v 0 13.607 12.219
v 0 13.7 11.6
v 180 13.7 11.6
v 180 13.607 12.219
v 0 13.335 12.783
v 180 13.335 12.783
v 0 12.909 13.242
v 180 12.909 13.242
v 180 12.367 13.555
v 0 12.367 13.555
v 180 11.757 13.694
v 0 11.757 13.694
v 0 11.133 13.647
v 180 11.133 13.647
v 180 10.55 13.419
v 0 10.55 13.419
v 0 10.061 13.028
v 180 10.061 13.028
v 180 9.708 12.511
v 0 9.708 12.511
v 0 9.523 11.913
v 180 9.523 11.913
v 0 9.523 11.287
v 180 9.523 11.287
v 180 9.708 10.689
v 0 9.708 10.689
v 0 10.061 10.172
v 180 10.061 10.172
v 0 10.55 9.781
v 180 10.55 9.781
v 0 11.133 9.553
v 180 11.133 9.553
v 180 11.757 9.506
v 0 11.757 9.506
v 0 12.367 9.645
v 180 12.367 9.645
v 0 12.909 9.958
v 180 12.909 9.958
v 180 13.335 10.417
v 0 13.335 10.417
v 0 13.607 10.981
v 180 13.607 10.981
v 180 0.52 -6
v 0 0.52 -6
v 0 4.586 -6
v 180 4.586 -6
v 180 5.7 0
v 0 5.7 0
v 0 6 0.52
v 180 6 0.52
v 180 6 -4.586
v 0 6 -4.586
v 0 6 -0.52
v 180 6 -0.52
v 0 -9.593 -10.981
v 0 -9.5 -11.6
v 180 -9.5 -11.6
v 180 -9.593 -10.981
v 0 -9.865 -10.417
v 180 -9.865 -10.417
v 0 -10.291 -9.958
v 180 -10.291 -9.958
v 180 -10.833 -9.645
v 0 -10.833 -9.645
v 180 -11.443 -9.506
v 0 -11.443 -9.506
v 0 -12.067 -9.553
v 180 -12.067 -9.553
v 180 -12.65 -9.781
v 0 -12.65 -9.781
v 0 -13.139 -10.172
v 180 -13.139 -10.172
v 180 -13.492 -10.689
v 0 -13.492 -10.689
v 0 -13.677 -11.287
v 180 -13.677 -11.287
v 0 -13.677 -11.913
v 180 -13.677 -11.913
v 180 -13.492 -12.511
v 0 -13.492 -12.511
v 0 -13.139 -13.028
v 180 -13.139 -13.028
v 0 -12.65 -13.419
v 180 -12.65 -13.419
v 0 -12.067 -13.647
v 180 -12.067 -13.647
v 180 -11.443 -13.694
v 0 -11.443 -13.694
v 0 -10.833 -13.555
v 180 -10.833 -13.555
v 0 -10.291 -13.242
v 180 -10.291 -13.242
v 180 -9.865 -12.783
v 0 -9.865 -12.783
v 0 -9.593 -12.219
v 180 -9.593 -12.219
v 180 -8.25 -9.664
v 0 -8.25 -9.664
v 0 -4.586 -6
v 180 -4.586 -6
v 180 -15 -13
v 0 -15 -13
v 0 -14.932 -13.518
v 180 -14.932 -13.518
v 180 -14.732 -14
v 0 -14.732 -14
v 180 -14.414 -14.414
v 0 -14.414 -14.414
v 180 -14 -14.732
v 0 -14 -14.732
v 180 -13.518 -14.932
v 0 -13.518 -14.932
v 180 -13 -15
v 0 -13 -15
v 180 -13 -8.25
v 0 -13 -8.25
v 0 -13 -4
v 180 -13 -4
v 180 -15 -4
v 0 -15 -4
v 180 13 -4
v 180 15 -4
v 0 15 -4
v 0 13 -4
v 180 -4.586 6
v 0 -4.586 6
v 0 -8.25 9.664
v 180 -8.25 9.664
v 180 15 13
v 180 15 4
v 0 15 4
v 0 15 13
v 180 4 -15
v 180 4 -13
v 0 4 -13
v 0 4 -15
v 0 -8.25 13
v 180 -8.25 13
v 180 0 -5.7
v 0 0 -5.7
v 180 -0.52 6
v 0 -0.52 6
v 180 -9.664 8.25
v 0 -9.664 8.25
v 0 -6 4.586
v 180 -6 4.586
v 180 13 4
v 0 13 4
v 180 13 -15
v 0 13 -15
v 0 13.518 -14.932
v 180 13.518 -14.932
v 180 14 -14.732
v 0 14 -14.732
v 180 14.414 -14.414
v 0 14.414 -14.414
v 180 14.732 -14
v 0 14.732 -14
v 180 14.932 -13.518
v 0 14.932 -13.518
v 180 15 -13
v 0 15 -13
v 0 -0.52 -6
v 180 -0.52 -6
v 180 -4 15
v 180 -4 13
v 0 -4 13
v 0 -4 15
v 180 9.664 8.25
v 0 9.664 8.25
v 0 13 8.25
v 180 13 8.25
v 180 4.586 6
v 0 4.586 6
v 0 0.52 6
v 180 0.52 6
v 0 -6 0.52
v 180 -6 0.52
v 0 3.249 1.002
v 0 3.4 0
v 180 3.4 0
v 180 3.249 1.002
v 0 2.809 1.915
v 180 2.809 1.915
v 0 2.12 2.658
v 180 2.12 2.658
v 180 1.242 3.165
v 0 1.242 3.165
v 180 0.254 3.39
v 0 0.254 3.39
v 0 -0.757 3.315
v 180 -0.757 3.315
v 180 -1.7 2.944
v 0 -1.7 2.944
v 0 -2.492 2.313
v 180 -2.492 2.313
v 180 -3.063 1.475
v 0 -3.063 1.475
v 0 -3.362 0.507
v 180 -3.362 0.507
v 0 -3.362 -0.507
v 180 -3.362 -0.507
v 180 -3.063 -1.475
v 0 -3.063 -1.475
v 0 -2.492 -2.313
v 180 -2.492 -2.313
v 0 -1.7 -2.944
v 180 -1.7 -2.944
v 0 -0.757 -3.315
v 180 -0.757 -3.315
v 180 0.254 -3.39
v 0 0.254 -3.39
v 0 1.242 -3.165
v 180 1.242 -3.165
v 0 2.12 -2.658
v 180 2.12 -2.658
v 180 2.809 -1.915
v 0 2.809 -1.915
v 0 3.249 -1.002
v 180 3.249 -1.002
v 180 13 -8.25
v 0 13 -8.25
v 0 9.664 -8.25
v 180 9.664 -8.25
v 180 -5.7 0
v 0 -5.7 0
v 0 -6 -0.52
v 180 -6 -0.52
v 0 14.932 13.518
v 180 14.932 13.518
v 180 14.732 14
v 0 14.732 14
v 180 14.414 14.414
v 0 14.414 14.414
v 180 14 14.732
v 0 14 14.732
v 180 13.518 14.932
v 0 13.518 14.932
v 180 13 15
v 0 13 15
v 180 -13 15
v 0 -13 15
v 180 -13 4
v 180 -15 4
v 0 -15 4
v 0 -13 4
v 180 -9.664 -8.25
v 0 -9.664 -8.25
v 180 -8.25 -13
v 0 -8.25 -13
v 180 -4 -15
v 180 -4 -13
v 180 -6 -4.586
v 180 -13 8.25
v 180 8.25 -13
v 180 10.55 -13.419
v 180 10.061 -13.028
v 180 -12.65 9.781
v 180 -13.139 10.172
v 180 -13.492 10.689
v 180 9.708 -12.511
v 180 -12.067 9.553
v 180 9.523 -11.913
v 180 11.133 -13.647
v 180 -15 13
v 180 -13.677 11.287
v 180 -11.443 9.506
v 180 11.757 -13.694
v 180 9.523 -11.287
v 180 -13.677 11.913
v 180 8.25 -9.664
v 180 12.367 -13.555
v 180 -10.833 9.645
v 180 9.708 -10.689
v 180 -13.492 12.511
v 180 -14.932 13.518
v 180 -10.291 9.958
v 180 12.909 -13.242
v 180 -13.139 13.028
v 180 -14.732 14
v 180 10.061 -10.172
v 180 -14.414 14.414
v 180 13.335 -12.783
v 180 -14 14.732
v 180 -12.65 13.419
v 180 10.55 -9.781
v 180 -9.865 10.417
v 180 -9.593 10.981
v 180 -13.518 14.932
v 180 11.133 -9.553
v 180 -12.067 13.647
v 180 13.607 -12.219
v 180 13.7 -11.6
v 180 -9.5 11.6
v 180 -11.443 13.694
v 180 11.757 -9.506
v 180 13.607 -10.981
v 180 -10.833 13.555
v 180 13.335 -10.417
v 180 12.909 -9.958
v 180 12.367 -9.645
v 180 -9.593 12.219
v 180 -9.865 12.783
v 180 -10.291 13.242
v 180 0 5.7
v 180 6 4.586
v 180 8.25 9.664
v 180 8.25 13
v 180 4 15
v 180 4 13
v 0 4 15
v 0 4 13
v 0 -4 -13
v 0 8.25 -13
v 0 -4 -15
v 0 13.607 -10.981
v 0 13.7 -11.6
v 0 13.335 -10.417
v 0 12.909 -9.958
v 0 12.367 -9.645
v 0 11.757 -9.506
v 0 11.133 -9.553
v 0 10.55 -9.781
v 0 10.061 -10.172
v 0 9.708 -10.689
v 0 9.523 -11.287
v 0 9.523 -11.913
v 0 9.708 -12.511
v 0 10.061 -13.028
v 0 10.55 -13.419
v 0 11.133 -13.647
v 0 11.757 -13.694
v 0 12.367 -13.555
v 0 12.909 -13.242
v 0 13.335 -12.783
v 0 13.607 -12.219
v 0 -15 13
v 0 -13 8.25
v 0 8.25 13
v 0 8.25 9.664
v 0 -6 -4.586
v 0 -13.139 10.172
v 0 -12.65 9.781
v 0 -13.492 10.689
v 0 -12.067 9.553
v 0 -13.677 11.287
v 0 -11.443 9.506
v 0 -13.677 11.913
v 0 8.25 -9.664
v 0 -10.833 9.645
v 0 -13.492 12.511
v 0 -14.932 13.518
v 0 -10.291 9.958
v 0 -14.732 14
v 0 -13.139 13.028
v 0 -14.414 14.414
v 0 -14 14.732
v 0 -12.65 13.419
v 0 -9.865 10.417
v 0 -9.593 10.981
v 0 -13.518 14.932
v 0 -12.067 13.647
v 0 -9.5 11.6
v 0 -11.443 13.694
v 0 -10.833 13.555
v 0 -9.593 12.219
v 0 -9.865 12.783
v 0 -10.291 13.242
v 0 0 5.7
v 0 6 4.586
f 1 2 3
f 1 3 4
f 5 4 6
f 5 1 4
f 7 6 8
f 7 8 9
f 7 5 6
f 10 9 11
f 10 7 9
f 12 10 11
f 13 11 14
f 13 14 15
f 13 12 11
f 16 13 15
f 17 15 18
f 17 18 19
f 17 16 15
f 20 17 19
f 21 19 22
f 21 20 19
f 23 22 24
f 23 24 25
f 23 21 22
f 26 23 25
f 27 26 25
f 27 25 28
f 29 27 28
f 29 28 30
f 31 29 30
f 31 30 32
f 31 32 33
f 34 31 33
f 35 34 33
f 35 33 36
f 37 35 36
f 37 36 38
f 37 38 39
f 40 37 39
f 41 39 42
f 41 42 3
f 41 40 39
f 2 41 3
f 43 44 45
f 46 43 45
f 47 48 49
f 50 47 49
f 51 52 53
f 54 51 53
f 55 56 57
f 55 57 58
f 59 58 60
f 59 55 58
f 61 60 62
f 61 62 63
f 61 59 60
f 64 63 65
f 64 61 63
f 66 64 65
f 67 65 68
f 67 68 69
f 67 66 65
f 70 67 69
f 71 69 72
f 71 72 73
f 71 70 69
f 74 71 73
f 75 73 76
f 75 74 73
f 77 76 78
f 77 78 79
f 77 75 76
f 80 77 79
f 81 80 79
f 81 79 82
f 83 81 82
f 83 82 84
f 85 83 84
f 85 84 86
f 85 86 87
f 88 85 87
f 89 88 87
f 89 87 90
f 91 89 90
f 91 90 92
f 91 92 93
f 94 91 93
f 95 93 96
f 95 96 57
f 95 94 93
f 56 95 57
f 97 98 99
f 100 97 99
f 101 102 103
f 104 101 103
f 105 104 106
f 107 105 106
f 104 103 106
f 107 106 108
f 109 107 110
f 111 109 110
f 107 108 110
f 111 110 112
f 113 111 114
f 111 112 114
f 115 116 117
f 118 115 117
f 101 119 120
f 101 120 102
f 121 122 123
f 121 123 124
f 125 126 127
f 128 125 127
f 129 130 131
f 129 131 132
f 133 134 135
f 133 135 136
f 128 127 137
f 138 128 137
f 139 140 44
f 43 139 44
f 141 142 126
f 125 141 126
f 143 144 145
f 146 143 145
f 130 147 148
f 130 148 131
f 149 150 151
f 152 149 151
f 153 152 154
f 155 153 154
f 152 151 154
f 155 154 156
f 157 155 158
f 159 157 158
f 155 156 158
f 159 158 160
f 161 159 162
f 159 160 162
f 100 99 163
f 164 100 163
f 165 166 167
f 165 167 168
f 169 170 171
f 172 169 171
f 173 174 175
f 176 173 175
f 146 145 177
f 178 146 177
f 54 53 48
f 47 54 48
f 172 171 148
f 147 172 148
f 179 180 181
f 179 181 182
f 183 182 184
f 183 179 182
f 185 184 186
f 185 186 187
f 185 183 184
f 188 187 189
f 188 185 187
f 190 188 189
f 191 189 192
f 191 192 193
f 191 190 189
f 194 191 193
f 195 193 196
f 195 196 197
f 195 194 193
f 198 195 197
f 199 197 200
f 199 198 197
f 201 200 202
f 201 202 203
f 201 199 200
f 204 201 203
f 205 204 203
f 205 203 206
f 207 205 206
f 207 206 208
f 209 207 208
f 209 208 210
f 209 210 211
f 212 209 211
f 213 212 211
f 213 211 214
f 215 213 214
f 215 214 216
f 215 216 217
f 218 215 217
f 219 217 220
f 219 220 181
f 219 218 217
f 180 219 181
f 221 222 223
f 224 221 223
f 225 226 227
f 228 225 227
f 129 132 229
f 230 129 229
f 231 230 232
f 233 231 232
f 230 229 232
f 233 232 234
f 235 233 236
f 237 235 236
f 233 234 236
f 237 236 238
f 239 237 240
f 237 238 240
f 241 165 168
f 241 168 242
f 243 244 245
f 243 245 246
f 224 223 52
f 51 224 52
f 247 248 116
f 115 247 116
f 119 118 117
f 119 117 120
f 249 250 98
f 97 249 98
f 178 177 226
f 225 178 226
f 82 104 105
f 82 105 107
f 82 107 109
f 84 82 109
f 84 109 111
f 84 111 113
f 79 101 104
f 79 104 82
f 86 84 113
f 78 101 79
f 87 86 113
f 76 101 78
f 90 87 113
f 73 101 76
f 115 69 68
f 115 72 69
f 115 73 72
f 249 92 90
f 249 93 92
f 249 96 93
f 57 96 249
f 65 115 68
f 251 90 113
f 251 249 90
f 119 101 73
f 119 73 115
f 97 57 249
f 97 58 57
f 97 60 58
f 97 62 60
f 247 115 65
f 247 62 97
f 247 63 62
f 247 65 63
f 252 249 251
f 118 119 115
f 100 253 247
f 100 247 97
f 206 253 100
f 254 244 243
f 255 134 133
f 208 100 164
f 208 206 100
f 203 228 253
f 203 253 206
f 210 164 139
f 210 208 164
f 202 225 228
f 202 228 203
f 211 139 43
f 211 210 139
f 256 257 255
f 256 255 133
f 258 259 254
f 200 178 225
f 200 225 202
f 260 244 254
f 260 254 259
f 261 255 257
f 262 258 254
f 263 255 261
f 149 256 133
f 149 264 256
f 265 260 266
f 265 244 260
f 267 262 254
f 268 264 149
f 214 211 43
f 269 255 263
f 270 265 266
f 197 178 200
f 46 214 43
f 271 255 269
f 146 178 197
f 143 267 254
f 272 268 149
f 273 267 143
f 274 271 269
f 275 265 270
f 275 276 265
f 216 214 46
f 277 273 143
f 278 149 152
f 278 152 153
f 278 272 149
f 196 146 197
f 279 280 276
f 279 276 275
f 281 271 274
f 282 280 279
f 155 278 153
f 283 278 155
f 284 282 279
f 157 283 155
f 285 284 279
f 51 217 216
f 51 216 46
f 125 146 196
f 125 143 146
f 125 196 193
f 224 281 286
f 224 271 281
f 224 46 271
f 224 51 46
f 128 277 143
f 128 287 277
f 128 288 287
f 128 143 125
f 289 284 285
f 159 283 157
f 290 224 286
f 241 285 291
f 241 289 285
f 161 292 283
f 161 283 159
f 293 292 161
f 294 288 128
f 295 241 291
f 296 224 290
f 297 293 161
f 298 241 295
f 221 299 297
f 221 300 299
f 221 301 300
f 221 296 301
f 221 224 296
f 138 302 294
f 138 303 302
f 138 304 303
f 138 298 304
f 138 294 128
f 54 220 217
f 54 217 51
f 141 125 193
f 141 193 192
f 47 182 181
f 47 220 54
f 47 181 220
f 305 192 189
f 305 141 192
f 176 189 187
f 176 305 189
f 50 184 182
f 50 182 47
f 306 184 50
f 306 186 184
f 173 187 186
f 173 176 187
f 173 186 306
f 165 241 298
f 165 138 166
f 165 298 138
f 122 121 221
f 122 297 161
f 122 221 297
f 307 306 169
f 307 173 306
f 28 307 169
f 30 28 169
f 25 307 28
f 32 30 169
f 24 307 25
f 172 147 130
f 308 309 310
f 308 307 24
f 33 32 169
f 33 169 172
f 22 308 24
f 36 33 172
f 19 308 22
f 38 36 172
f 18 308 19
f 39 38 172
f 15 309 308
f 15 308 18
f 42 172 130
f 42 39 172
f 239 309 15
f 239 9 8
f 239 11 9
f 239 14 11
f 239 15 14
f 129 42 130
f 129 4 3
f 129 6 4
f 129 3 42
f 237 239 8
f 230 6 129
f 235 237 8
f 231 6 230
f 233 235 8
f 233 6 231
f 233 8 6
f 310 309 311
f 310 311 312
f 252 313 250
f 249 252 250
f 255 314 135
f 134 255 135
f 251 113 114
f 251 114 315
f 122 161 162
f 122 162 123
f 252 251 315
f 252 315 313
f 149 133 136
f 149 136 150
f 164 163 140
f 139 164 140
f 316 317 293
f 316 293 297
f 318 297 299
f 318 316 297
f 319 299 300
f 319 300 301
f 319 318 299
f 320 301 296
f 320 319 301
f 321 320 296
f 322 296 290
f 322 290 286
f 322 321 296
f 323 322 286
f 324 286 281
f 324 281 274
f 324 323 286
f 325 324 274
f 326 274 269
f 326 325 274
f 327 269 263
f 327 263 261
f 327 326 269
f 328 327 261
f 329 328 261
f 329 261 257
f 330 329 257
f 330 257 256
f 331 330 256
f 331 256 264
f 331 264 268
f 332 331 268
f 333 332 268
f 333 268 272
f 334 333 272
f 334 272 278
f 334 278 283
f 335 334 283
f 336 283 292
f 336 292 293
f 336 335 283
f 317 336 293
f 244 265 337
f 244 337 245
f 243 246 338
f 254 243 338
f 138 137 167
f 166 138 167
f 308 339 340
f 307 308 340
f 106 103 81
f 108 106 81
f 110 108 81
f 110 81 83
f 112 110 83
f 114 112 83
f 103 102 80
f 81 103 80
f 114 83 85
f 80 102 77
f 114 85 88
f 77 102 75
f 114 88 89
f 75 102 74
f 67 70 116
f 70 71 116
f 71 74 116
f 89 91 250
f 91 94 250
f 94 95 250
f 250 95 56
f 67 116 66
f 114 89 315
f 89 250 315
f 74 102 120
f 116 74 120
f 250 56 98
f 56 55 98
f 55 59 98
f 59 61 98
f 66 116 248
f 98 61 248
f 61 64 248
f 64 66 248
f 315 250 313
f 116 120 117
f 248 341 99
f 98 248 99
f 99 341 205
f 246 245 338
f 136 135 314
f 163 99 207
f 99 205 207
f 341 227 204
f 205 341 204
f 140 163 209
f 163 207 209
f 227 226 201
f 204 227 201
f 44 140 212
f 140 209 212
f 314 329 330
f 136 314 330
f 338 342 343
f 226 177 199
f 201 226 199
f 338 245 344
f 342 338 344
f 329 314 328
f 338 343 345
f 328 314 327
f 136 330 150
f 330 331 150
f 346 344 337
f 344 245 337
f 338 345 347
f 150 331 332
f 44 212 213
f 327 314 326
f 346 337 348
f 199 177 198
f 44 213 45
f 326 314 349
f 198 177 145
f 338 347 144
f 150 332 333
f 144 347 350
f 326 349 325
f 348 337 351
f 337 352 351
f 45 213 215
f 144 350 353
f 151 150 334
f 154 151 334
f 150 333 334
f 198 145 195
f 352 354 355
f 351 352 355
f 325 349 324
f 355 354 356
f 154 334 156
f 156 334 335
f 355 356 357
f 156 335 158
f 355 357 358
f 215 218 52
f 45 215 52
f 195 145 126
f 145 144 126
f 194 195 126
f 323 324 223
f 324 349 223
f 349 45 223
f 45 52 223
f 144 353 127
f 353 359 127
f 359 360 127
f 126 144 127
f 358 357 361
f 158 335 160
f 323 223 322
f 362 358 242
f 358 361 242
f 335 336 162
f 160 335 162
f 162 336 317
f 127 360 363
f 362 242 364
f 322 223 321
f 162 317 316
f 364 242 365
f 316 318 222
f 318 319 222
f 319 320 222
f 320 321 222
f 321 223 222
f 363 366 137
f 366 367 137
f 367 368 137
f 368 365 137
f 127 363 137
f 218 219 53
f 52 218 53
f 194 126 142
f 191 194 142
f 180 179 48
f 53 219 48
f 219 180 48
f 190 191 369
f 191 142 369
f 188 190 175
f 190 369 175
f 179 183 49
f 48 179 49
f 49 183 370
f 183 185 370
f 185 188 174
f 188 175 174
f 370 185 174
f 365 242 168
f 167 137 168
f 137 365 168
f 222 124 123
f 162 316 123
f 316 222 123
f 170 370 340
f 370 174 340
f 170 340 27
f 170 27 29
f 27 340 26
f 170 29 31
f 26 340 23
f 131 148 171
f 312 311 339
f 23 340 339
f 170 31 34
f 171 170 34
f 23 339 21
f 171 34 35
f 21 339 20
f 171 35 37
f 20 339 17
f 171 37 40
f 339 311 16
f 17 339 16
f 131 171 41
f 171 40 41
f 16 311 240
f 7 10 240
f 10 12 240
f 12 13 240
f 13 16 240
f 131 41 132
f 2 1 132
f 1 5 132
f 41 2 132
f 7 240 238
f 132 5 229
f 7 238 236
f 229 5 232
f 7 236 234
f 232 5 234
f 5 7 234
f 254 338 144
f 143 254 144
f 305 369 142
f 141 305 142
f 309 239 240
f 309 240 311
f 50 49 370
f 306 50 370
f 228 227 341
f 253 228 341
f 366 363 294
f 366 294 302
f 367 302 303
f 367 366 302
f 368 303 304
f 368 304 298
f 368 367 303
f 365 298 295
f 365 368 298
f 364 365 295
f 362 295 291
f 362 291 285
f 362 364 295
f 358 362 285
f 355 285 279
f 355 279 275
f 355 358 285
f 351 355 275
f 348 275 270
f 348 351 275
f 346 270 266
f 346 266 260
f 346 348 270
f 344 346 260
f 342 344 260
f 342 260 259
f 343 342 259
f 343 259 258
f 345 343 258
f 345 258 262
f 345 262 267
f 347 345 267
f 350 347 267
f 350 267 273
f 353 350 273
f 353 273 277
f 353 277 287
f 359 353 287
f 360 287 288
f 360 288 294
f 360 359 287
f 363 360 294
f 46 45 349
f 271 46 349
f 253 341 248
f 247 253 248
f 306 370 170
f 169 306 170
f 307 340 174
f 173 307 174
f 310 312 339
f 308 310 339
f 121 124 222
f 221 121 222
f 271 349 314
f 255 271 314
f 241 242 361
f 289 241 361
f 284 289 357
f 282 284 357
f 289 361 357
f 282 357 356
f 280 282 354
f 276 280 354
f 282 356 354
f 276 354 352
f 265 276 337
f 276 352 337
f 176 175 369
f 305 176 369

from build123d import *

# Parameters (mm, degrees)
SKETCH11_R              = 3.4
SKETCH11_R_2            = 2.1
NH_H_NH_30X30X2_1_DEPTH = 180


with BuildPart() as part:
    # Sketch11 → Ðnh hình 30X30X2(1) (new body)
    with BuildSketch(Plane.YZ):
        with BuildLine():
            Line((13, -4), (13, -8.25))
            Line((13, -8.25), (9.664213562, -8.25))
            Line((9.664213562, -8.25), (6, -4.585786438))
            Line((6, -4.585786438), (6, -0.519615242))
            Line((6, -0.519615242), (5.7, 0))
            Line((5.7, 0), (6, 0.519615242))
            Line((6, 0.519615242), (6, 4.585786438))
            Line((6, 4.585786438), (9.664213562, 8.25))
            Line((9.664213562, 8.25), (13, 8.25))
            Line((13, 8.25), (13, 4))
            Line((13, 4), (15, 4))
            Line((15, 4), (15, 13))
            ThreePointArc((15, 13), (14.414213562, 14.414213562), (13, 15))
            Line((13, 15), (4, 15))
            Line((4, 15), (4, 13))
            Line((4, 13), (8.25, 13))
            Line((8.25, 13), (8.25, 9.664213562))
            Line((8.25, 9.664213562), (4.585786438, 6))
            Line((4.585786438, 6), (0.519615242, 6))
            Line((0.519615242, 6), (0, 5.7))
            Line((0, 5.7), (-0.519615242, 6))
            Line((-0.519615242, 6), (-4.585786438, 6))
            Line((-4.585786438, 6), (-8.25, 9.664213562))
            Line((-8.25, 9.664213562), (-8.25, 13))
            Line((-8.25, 13), (-4, 13))
            Line((-4, 13), (-4, 15))
            Line((-4, 15), (-13, 15))
            ThreePointArc((-13, 15), (-14.414213562, 14.414213562), (-15, 13))
            Line((-15, 13), (-15, 4))
            Line((-15, 4), (-13, 4))
            Line((-13, 4), (-13, 8.25))
            Line((-13, 8.25), (-9.664213562, 8.25))
            Line((-9.664213562, 8.25), (-6, 4.585786438))
            Line((-6, 4.585786438), (-6, 0.519615242))
            Line((-6, 0.519615242), (-5.7, 0))
            Line((-5.7, 0), (-6, -0.519615242))
            Line((-6, -0.519615242), (-6, -4.585786438))
            Line((-6, -4.585786438), (-9.664213562, -8.25))
            Line((-9.664213562, -8.25), (-13, -8.25))
            Line((-13, -8.25), (-13, -4))
            Line((-13, -4), (-15, -4))
            Line((-15, -4), (-15, -13))
            ThreePointArc((-15, -13), (-14.414213562, -14.414213562), (-13, -15))
            Line((-13, -15), (-4, -15))
            Line((-4, -15), (-4, -13))
            Line((-4, -13), (-8.25, -13))
            Line((-8.25, -13), (-8.25, -9.664213562))
            Line((-8.25, -9.664213562), (-4.585786438, -6))
            Line((-4.585786438, -6), (-0.519615242, -6))
            Line((-0.519615242, -6), (0, -5.7))
            Line((0, -5.7), (0.519615242, -6))
            Line((0.519615242, -6), (4.585786438, -6))
            Line((4.585786438, -6), (8.25, -9.664213562))
            Line((8.25, -9.664213562), (8.25, -13))
            Line((8.25, -13), (4, -13))
            Line((4, -13), (4, -15))
            Line((4, -15), (13, -15))
            ThreePointArc((13, -15), (14.414213562, -14.414213562), (15, -13))
            Line((15, -13), (15, -4))
            Line((15, -4), (13, -4))
        make_face()
        Circle(SKETCH11_R, mode=Mode.SUBTRACT)
        with Locations((11.6, -11.6)):
            Circle(SKETCH11_R_2, mode=Mode.SUBTRACT)
        with Locations((11.6, 11.6)):
            Circle(SKETCH11_R_2, mode=Mode.SUBTRACT)
        with Locations((-11.6, 11.6)):
            Circle(SKETCH11_R_2, mode=Mode.SUBTRACT)
        with Locations((-11.6, -11.6)):
            Circle(SKETCH11_R_2, mode=Mode.SUBTRACT)
    extrude(amount=NH_H_NH_30X30X2_1_DEPTH)


solid = part.part
